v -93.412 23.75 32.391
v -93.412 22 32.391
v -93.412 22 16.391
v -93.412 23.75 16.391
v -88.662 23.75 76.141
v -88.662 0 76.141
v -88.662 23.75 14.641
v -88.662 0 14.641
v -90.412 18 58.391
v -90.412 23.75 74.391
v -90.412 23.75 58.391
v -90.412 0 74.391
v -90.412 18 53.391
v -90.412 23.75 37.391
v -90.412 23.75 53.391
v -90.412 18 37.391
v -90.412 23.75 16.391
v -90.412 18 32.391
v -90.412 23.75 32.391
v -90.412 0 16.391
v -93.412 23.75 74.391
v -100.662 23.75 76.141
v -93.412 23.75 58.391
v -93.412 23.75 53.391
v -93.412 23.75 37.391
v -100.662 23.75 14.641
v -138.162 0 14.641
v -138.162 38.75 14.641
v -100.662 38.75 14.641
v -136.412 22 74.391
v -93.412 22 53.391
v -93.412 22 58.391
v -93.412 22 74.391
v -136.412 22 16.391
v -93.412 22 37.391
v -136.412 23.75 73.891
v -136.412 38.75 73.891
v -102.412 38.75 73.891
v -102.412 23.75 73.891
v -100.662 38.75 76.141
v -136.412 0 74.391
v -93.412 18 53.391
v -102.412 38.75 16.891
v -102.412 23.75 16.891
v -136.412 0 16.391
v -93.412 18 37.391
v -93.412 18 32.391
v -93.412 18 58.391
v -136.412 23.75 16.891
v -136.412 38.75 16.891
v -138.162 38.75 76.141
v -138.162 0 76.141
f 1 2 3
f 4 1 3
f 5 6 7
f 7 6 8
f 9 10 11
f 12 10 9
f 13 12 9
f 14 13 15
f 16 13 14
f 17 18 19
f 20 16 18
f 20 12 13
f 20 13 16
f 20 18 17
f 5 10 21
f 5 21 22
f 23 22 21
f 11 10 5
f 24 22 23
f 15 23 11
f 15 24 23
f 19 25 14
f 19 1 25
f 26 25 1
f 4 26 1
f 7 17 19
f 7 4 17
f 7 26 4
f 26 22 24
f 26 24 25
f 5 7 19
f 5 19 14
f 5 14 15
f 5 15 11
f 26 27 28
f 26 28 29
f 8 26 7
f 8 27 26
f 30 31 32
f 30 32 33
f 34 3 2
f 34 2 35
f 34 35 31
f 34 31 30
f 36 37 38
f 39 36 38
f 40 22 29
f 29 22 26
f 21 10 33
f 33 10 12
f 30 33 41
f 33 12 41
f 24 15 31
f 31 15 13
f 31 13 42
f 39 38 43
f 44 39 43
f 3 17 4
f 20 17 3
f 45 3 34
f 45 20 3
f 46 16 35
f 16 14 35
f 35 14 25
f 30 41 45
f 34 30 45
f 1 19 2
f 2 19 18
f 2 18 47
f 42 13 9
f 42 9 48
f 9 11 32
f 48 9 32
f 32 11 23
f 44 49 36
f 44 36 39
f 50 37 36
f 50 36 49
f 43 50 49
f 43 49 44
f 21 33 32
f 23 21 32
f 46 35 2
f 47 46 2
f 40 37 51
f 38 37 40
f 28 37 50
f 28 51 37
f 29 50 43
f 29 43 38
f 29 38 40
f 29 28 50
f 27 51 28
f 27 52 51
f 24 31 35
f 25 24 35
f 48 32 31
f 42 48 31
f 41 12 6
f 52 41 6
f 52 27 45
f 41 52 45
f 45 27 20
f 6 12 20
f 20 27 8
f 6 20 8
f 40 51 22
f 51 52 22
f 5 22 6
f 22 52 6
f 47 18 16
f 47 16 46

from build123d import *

# Parameters (mm, degrees)
SKETCH1_W           = 49.5
SKETCH1_H           = 61.5
BOSS_EXTRUDE1_DEPTH = 23.75
SKETCH2_W           = 46
SKETCH2_H           = 58
CUT_EXTRUDE1_DEPTH  = 22
SKETCH3_W           = 3
SKETCH3_H           = 16
CUT_EXTRUDE2_DEPTH  = 1.75
SKETCH7_W           = 3
SKETCH7_H           = 5
BOSS_EXTRUDE2_DEPTH = 4
SKETCH11_W          = 37.5
SKETCH11_H          = 61.5
BOSS_EXTRUDE3_DEPTH = 15
SKETCH12_W          = 34
SKETCH12_H          = 57
CUT_EXTRUDE3_DEPTH  = 15


with BuildPart() as part:
    # Sketch1 → Boss-Extrude1 (new body)
    with BuildSketch(Plane(origin=(0, 0, 0), x_dir=(1, 0, 0), z_dir=(0, 1, 0))):
        with Locations((-113.412024913, -45.391200727)):
            Rectangle(SKETCH1_W, SKETCH1_H)
    extrude(amount=BOSS_EXTRUDE1_DEPTH)

    # Sketch2 → Cut-Extrude1 (cut)
    with BuildSketch(Plane(origin=(0, 0, 0), x_dir=(-1, 0, 0), z_dir=(0, -1, 0))):
        with Locations((113.412024913, -45.391200727)):
            Rectangle(SKETCH2_W, SKETCH2_H)
    extrude(amount=-CUT_EXTRUDE1_DEPTH, mode=Mode.SUBTRACT)

    # Sketch3 → Cut-Extrude2 (cut)
    with BuildSketch(Plane(origin=(0, 22, 0), x_dir=(-1, 0, 0), z_dir=(0, -1, 0))):
        with Locations((91.912024913, -66.391200727)):
            Rectangle(SKETCH3_W, SKETCH3_H)
        with Locations((91.912024913, -24.391200727)):
            Rectangle(SKETCH3_W, SKETCH3_H)
        with Locations((91.912024913, -45.391200727)):
            Rectangle(SKETCH3_W, SKETCH3_H)
    extrude(amount=-CUT_EXTRUDE2_DEPTH, mode=Mode.SUBTRACT)

    # Sketch7 → Boss-Extrude2 (add)
    with BuildSketch(Plane(origin=(0, 22, 0), x_dir=(-1, 0, 0), z_dir=(0, -1, 0))):
        with Locations((91.912024913, -55.891200727)):
            Rectangle(SKETCH7_W, SKETCH7_H)
        with Locations((91.912024913, -34.891200727)):
            Rectangle(SKETCH7_W, SKETCH7_H)
    extrude(amount=BOSS_EXTRUDE2_DEPTH)

    # Sketch11 → Boss-Extrude3 (add)
    with BuildSketch(Plane(origin=(0, 23.75, 0), x_dir=(1, 0, 0), z_dir=(0, 1, 0))):
        with Locations((-119.412024913, -45.391200727)):
            Rectangle(SKETCH11_W, SKETCH11_H)
    extrude(amount=BOSS_EXTRUDE3_DEPTH)

    # Sketch12 → Cut-Extrude3 (cut)
    with BuildSketch(Plane(origin=(0, 38.75, 0), x_dir=(1, 0, 0), z_dir=(0, 1, 0))):
        with Locations((-119.412024913, -45.391200727)):
            Rectangle(SKETCH12_W, SKETCH12_H)
    extrude(amount=-CUT_EXTRUDE3_DEPTH, mode=Mode.SUBTRACT)


solid = part.part
